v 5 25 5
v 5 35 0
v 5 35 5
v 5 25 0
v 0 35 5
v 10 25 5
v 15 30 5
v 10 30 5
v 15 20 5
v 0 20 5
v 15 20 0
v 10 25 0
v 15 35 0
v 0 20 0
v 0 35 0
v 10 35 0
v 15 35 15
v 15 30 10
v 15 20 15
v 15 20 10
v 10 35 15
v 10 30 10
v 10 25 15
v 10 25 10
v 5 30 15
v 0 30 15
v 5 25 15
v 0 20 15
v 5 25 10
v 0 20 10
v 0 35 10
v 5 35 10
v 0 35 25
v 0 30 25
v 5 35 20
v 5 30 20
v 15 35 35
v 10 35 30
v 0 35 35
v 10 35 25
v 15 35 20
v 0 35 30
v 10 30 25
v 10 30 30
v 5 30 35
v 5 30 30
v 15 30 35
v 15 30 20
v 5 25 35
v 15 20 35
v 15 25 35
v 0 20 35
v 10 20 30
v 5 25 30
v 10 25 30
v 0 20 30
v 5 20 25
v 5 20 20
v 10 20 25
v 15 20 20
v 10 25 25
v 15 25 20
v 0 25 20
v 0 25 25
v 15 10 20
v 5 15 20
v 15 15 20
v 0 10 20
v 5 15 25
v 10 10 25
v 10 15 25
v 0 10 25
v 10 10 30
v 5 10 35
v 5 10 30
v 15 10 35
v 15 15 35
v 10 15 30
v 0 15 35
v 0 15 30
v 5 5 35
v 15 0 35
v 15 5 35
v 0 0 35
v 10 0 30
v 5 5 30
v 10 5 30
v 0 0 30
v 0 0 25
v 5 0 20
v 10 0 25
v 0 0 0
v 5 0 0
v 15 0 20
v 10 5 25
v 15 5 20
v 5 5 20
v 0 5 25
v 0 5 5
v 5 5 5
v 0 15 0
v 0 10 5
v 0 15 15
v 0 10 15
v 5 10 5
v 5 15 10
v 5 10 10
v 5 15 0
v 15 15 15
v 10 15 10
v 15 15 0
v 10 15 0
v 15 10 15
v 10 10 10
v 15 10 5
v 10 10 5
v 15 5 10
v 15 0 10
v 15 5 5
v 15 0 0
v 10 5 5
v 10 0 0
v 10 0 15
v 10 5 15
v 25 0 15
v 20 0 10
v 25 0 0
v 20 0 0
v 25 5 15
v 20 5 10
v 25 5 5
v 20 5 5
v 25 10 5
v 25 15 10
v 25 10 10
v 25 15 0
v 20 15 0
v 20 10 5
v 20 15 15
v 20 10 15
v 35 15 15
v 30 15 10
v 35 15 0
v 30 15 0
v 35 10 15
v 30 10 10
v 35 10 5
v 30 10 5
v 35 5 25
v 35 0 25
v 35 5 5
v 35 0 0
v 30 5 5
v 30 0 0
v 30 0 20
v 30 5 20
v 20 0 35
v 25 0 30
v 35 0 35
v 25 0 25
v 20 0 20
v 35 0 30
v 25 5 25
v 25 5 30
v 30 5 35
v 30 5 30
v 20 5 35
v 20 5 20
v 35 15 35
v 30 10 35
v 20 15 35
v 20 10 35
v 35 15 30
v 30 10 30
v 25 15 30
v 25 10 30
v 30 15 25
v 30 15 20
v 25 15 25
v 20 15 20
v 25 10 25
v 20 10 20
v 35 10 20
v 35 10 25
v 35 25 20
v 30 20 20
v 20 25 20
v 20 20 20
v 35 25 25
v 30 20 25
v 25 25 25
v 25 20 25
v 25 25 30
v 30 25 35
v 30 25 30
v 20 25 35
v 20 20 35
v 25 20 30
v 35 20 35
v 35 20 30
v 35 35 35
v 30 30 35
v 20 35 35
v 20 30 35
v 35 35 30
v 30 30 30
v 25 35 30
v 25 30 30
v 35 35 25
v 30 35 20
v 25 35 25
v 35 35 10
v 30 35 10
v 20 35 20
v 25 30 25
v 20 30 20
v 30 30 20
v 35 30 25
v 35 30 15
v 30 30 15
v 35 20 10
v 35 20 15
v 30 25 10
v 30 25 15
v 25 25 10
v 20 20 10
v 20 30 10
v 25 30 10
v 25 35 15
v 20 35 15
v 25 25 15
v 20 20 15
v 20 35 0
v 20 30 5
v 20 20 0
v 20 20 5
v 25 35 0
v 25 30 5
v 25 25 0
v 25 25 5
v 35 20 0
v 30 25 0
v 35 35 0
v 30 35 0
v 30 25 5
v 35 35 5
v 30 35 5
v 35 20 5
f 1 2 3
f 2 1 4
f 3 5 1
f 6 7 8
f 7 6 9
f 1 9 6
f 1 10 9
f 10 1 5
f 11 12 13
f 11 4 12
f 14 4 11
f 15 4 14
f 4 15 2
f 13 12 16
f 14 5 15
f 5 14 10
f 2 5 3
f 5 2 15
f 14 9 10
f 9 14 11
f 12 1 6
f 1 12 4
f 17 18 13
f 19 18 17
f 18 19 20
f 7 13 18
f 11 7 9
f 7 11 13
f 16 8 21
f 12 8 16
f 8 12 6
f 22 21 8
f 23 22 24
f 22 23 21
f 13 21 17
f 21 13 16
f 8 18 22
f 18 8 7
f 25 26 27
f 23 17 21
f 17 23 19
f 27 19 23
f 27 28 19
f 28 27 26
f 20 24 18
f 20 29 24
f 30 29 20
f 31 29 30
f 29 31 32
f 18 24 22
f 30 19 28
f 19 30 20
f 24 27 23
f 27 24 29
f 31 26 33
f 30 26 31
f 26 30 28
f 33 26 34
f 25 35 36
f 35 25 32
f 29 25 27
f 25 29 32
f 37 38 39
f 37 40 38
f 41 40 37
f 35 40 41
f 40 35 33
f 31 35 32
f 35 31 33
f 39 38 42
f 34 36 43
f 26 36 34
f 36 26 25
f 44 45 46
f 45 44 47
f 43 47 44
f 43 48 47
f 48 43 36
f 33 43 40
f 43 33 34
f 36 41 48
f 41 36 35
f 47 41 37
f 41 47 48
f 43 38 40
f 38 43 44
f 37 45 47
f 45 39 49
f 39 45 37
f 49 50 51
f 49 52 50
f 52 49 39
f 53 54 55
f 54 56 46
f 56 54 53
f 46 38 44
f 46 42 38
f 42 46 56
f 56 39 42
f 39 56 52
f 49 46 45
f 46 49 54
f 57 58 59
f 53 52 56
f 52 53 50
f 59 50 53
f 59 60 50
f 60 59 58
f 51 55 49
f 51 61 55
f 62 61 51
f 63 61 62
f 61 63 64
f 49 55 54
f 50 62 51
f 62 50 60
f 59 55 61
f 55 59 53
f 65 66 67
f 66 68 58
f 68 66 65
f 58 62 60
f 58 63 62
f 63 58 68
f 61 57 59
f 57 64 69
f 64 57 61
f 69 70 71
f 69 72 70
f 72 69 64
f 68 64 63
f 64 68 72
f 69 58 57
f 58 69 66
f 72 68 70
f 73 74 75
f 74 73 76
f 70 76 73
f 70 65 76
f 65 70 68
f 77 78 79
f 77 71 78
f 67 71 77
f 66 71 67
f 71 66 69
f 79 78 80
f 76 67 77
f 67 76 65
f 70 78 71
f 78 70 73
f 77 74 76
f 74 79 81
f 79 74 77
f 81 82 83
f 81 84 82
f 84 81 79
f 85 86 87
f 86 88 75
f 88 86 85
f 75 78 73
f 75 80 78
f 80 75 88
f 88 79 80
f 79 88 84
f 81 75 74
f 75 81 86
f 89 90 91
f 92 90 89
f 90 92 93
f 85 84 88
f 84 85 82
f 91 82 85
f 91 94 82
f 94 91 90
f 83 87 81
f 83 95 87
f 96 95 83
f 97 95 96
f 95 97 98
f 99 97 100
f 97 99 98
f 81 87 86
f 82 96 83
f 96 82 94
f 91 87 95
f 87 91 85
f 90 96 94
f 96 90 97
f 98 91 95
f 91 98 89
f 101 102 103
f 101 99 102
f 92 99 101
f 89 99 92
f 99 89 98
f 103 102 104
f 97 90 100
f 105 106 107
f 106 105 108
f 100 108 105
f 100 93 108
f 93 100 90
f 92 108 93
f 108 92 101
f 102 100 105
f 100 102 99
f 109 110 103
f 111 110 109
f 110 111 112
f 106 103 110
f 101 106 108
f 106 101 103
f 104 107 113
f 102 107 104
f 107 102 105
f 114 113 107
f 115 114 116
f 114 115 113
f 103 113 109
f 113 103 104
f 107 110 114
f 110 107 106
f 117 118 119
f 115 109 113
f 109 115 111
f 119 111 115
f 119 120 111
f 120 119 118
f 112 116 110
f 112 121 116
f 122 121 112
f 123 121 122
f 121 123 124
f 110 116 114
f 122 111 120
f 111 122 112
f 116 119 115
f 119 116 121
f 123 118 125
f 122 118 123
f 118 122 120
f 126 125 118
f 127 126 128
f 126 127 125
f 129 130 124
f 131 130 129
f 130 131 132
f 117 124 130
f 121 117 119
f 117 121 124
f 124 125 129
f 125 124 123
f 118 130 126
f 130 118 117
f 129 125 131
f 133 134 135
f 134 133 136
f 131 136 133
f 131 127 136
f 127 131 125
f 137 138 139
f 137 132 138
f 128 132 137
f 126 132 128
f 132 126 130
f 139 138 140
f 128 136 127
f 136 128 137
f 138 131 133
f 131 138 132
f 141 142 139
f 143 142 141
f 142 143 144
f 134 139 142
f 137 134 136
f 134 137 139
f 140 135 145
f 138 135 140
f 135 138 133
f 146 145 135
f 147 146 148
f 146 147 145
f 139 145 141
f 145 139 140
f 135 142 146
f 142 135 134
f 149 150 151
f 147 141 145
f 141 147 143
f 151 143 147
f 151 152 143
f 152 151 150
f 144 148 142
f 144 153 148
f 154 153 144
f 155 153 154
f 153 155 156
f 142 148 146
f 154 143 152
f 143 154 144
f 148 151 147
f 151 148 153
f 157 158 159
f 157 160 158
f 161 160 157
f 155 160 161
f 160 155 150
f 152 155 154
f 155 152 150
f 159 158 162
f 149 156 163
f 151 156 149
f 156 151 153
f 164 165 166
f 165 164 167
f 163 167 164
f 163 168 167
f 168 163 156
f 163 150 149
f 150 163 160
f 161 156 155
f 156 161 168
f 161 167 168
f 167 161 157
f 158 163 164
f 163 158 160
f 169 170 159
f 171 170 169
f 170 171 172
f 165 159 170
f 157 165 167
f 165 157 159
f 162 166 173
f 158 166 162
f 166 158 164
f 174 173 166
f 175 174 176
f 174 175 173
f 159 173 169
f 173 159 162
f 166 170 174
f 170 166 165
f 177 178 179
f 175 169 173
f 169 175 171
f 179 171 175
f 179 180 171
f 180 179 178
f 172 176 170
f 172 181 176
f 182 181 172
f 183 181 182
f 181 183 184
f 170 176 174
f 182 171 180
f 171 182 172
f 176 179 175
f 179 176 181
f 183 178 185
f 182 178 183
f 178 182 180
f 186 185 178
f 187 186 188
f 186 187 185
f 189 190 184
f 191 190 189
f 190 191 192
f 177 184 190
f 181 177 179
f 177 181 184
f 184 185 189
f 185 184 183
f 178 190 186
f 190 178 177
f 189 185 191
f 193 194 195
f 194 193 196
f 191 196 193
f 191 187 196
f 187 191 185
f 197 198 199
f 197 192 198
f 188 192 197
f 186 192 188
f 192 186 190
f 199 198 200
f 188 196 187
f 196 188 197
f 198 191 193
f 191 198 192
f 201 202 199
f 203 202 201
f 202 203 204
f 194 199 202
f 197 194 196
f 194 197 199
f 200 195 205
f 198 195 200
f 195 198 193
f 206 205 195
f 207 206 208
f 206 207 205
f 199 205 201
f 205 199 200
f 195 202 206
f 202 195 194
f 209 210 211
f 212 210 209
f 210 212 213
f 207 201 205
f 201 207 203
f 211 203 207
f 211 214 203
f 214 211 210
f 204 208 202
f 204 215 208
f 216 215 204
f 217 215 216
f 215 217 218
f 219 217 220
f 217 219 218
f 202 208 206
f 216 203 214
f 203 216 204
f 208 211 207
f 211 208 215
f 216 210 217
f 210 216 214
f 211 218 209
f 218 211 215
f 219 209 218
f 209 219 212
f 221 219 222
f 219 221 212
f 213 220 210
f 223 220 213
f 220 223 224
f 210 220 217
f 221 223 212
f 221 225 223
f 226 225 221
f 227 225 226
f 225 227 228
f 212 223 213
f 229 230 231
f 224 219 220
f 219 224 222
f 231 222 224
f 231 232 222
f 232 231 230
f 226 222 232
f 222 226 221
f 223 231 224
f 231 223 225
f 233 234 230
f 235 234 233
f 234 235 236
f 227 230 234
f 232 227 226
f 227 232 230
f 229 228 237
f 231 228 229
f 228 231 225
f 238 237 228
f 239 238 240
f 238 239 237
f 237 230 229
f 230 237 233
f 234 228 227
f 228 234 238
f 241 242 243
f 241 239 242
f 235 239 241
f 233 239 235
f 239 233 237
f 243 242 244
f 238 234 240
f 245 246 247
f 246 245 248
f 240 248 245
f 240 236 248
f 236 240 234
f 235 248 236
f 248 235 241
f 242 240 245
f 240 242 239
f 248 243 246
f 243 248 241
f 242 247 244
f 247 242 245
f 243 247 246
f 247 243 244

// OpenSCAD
//Script adapted from http://thomasdiewald.com/blog/?p=561

/* [Main Parameters] */
//Make an n-th order hilbert cube
Iterations = 2;//[1:4]

//How wide the corners are
corner_size = 5;

//How far apart the corners are
gap_size = 5;

//How wide the beams are in between corners, set to 0 to have the beam size equal to the corner size
beam_size = 0;


/* [Hidden] */

//Normalize corner size above 0
real_corner_size = (corner_size > 0)? corner_size: 5;

//Normalize gap size above 0
real_gap_size = (gap_size > 0)? gap_size: real_corner_size;

//Normalize beam size above 0 and less than or equal to corner size
real_beam_size = (beam_size > 0 && beam_size <= corner_size)? beam_size: real_corner_size;

drawhilbert(real_corner_size, real_gap_size, real_beam_size, Iterations);


module drawhilbert(corner_size, gap_size, beam_size, iterations){
    //flatmult = pow(2,iterations+1);//Used in flatten function
        
    // size = pow(2,iterations) * spacing/5;//Used for consistent spacing
        
    cubes = hilbert(iterations = iterations);//Generates flat array of numbers
    
    beam_offset = [for (i=[0:2]) (corner_size - beam_size) / 2];  
            
    cubelocs = [for(i=[0:len(cubes) - 1]) getmulticoords(cubes[i], corner_size, gap_size)];
        
    for(a = [0:len(cubes)-2]){
        line(cube1=cubelocs[a],
            cube2=cubelocs[a+1],
            corner_size = corner_size,
            beam_width = beam_size,
            beam_offset = beam_offset);
    }//Goes through vector and renders cubes
}

// Render the connection between two corners
 module line(cube1,cube2, corner_size, beam_width, beam_offset){
     translate(cube1) cube(corner_size); //Generates corners
     translate(cube2) cube(corner_size);
     
    hull(){//Generates beams
        translate(cube1+ beam_offset) cube(beam_width);
        translate(cube2+ beam_offset) cube(beam_width);}
}

/*
This defines the relative locations of each corner
For example, corner 0 is the corner with small X and Z, but large Y
You will notice that this corresponds to the placement of cubes for a basic hilbert cube
So the corners of a 1st-order hilbert cube is this list in order
*/
cornerlocs = [
    [0, 1, 0],
    [0, 1, 1],
    [0, 0, 1],
    [0, 0, 0],
    [1, 0, 0],
    [1, 0, 1],
    [1, 1, 1],
    [1, 1, 0]
];

// Subtract 1 from every element of a 2d array
function sub12d(arr) = 
    [for (i = [0:len(arr)-1]) 
        [for (j = [0:len(arr[i])-1]) arr[i][j] - 1]];
            
function cat(lists) = [for(L=lists, a=L) a];
    
function getcoords(position, cornersize, gapsize)=
    position * (cornersize + gapsize);

function getmulticoords(positions, cornersize, gapsize) =
    [for(i=[0:len(positions) - 1]) getcoords(positions[i], cornersize, gapsize)];


/*
This matrix defines how smaller hilbert cubes make up larger ones
Using a 2D hilbert curve as an example

This is a first-order curve:

*-*
| |
* *

We draw this curve as a single stroke:

2-3
| |
1 4

The second order curve will look like this:

***?***
***?***
***?***
??? ???
*** ***
*** ***
*** ***

A 3x3 grouping of stars means that a smaller hilbert curve is located there
The question marks are where two smaller hilbert curves connect to each other

We know that the hilbert curve actually connects like this:

*-* *-*
| | | |
* *-* *
|     |
*-* *-*
  | |  
*-* *-*

Within each section, the stroke order goes like this:

2-3 2-3
| | | |
1 4-1 4
|     |
4-3 2-1
  | |  
1-2 3-4

BUT the stroke order of the curve as a whole looks like this if you shrink it down:

2-3
| |
1 4

So the stroke order of the 2nd and 3rd sub-hilberts is the same, but the stroke order of 1 and 4 is different. We store the difference in stroke order the following way:

Overlay the original stroke ordering over each sub-Hilbert curve like this:

2-3 2-3
| | | |
1 4-1 4
|     |
2-3 2-3
  | |  
1-4 1-4

Now, follow the original stroke ordering and you get:

1-4-3-2-1-2-3-4-1-2-3-4-3-2-1-4

Break that up into a 4x4 matrix for 
[
    [1, 4, 3, 2],
    [1, 2, 3, 4],
    [1, 2, 3, 4],
    [3, 2, 1, 4]
]

The following is the same idea in three dimensions
*/

stroke_ordering = sub12d([
    [1, 4, 5, 8, 7, 6, 3, 2],
    [1, 8, 7, 2, 3, 6, 5, 4],
    [1, 8, 7, 2, 3, 6, 5, 4],
    [3, 4, 1, 2, 7, 8, 5, 6],
    [3, 4, 1, 2, 7, 8, 5, 6],
    [5, 4, 3, 6, 7, 2, 1, 8],
    [5, 4, 3, 6, 7, 2, 1, 8],
    [7, 6, 3, 2, 1, 4, 5, 8]
]);


// Recursive function for generating a list of where cube corners should be
// Base case: generate the location that a single corner cube should be
// Recursive case: concatenate the corner cubes of sub-hilberts
// Output: a list of cube coordinates in order of drawing
// baseloc: the corner of this cube closest to the origin
// iterations: how many times to recur
// cornerlocs: for the macro hilbert cube that is being drawn, in what order should
// the corners be drawn in
function hilbert(baseloc = [0,0,0], iterations, cornerlocs = [0,1,2,3,4,5,6,7])=
    let(cubesacross = pow(2, iterations-1))
    (iterations > 0)?
        cat([
            for (i = [0:7])
                hilbert(corner(cornerlocs[i], baseloc, cubesacross),
                            iterations -1,
                            [for (j=[0:7]) 
                                cornerlocs[stroke_ordering[i][j]]
                            ])
                

        ]):[baseloc];

// Get the location of a specific corner of the cube
// cnr: The index of the corner
// baseloc: The corner closest to the origin of this hilbert cube
// cubesacross: How large of a cube are we actually drawing (a 2nd-order cube will be larger than a 1st)
function corner(cnr, baseloc, cubesacross) = 
    [for (i = [0:2]) baseloc[i] + (cornerlocs[cnr][i] * cubesacross)];



  
